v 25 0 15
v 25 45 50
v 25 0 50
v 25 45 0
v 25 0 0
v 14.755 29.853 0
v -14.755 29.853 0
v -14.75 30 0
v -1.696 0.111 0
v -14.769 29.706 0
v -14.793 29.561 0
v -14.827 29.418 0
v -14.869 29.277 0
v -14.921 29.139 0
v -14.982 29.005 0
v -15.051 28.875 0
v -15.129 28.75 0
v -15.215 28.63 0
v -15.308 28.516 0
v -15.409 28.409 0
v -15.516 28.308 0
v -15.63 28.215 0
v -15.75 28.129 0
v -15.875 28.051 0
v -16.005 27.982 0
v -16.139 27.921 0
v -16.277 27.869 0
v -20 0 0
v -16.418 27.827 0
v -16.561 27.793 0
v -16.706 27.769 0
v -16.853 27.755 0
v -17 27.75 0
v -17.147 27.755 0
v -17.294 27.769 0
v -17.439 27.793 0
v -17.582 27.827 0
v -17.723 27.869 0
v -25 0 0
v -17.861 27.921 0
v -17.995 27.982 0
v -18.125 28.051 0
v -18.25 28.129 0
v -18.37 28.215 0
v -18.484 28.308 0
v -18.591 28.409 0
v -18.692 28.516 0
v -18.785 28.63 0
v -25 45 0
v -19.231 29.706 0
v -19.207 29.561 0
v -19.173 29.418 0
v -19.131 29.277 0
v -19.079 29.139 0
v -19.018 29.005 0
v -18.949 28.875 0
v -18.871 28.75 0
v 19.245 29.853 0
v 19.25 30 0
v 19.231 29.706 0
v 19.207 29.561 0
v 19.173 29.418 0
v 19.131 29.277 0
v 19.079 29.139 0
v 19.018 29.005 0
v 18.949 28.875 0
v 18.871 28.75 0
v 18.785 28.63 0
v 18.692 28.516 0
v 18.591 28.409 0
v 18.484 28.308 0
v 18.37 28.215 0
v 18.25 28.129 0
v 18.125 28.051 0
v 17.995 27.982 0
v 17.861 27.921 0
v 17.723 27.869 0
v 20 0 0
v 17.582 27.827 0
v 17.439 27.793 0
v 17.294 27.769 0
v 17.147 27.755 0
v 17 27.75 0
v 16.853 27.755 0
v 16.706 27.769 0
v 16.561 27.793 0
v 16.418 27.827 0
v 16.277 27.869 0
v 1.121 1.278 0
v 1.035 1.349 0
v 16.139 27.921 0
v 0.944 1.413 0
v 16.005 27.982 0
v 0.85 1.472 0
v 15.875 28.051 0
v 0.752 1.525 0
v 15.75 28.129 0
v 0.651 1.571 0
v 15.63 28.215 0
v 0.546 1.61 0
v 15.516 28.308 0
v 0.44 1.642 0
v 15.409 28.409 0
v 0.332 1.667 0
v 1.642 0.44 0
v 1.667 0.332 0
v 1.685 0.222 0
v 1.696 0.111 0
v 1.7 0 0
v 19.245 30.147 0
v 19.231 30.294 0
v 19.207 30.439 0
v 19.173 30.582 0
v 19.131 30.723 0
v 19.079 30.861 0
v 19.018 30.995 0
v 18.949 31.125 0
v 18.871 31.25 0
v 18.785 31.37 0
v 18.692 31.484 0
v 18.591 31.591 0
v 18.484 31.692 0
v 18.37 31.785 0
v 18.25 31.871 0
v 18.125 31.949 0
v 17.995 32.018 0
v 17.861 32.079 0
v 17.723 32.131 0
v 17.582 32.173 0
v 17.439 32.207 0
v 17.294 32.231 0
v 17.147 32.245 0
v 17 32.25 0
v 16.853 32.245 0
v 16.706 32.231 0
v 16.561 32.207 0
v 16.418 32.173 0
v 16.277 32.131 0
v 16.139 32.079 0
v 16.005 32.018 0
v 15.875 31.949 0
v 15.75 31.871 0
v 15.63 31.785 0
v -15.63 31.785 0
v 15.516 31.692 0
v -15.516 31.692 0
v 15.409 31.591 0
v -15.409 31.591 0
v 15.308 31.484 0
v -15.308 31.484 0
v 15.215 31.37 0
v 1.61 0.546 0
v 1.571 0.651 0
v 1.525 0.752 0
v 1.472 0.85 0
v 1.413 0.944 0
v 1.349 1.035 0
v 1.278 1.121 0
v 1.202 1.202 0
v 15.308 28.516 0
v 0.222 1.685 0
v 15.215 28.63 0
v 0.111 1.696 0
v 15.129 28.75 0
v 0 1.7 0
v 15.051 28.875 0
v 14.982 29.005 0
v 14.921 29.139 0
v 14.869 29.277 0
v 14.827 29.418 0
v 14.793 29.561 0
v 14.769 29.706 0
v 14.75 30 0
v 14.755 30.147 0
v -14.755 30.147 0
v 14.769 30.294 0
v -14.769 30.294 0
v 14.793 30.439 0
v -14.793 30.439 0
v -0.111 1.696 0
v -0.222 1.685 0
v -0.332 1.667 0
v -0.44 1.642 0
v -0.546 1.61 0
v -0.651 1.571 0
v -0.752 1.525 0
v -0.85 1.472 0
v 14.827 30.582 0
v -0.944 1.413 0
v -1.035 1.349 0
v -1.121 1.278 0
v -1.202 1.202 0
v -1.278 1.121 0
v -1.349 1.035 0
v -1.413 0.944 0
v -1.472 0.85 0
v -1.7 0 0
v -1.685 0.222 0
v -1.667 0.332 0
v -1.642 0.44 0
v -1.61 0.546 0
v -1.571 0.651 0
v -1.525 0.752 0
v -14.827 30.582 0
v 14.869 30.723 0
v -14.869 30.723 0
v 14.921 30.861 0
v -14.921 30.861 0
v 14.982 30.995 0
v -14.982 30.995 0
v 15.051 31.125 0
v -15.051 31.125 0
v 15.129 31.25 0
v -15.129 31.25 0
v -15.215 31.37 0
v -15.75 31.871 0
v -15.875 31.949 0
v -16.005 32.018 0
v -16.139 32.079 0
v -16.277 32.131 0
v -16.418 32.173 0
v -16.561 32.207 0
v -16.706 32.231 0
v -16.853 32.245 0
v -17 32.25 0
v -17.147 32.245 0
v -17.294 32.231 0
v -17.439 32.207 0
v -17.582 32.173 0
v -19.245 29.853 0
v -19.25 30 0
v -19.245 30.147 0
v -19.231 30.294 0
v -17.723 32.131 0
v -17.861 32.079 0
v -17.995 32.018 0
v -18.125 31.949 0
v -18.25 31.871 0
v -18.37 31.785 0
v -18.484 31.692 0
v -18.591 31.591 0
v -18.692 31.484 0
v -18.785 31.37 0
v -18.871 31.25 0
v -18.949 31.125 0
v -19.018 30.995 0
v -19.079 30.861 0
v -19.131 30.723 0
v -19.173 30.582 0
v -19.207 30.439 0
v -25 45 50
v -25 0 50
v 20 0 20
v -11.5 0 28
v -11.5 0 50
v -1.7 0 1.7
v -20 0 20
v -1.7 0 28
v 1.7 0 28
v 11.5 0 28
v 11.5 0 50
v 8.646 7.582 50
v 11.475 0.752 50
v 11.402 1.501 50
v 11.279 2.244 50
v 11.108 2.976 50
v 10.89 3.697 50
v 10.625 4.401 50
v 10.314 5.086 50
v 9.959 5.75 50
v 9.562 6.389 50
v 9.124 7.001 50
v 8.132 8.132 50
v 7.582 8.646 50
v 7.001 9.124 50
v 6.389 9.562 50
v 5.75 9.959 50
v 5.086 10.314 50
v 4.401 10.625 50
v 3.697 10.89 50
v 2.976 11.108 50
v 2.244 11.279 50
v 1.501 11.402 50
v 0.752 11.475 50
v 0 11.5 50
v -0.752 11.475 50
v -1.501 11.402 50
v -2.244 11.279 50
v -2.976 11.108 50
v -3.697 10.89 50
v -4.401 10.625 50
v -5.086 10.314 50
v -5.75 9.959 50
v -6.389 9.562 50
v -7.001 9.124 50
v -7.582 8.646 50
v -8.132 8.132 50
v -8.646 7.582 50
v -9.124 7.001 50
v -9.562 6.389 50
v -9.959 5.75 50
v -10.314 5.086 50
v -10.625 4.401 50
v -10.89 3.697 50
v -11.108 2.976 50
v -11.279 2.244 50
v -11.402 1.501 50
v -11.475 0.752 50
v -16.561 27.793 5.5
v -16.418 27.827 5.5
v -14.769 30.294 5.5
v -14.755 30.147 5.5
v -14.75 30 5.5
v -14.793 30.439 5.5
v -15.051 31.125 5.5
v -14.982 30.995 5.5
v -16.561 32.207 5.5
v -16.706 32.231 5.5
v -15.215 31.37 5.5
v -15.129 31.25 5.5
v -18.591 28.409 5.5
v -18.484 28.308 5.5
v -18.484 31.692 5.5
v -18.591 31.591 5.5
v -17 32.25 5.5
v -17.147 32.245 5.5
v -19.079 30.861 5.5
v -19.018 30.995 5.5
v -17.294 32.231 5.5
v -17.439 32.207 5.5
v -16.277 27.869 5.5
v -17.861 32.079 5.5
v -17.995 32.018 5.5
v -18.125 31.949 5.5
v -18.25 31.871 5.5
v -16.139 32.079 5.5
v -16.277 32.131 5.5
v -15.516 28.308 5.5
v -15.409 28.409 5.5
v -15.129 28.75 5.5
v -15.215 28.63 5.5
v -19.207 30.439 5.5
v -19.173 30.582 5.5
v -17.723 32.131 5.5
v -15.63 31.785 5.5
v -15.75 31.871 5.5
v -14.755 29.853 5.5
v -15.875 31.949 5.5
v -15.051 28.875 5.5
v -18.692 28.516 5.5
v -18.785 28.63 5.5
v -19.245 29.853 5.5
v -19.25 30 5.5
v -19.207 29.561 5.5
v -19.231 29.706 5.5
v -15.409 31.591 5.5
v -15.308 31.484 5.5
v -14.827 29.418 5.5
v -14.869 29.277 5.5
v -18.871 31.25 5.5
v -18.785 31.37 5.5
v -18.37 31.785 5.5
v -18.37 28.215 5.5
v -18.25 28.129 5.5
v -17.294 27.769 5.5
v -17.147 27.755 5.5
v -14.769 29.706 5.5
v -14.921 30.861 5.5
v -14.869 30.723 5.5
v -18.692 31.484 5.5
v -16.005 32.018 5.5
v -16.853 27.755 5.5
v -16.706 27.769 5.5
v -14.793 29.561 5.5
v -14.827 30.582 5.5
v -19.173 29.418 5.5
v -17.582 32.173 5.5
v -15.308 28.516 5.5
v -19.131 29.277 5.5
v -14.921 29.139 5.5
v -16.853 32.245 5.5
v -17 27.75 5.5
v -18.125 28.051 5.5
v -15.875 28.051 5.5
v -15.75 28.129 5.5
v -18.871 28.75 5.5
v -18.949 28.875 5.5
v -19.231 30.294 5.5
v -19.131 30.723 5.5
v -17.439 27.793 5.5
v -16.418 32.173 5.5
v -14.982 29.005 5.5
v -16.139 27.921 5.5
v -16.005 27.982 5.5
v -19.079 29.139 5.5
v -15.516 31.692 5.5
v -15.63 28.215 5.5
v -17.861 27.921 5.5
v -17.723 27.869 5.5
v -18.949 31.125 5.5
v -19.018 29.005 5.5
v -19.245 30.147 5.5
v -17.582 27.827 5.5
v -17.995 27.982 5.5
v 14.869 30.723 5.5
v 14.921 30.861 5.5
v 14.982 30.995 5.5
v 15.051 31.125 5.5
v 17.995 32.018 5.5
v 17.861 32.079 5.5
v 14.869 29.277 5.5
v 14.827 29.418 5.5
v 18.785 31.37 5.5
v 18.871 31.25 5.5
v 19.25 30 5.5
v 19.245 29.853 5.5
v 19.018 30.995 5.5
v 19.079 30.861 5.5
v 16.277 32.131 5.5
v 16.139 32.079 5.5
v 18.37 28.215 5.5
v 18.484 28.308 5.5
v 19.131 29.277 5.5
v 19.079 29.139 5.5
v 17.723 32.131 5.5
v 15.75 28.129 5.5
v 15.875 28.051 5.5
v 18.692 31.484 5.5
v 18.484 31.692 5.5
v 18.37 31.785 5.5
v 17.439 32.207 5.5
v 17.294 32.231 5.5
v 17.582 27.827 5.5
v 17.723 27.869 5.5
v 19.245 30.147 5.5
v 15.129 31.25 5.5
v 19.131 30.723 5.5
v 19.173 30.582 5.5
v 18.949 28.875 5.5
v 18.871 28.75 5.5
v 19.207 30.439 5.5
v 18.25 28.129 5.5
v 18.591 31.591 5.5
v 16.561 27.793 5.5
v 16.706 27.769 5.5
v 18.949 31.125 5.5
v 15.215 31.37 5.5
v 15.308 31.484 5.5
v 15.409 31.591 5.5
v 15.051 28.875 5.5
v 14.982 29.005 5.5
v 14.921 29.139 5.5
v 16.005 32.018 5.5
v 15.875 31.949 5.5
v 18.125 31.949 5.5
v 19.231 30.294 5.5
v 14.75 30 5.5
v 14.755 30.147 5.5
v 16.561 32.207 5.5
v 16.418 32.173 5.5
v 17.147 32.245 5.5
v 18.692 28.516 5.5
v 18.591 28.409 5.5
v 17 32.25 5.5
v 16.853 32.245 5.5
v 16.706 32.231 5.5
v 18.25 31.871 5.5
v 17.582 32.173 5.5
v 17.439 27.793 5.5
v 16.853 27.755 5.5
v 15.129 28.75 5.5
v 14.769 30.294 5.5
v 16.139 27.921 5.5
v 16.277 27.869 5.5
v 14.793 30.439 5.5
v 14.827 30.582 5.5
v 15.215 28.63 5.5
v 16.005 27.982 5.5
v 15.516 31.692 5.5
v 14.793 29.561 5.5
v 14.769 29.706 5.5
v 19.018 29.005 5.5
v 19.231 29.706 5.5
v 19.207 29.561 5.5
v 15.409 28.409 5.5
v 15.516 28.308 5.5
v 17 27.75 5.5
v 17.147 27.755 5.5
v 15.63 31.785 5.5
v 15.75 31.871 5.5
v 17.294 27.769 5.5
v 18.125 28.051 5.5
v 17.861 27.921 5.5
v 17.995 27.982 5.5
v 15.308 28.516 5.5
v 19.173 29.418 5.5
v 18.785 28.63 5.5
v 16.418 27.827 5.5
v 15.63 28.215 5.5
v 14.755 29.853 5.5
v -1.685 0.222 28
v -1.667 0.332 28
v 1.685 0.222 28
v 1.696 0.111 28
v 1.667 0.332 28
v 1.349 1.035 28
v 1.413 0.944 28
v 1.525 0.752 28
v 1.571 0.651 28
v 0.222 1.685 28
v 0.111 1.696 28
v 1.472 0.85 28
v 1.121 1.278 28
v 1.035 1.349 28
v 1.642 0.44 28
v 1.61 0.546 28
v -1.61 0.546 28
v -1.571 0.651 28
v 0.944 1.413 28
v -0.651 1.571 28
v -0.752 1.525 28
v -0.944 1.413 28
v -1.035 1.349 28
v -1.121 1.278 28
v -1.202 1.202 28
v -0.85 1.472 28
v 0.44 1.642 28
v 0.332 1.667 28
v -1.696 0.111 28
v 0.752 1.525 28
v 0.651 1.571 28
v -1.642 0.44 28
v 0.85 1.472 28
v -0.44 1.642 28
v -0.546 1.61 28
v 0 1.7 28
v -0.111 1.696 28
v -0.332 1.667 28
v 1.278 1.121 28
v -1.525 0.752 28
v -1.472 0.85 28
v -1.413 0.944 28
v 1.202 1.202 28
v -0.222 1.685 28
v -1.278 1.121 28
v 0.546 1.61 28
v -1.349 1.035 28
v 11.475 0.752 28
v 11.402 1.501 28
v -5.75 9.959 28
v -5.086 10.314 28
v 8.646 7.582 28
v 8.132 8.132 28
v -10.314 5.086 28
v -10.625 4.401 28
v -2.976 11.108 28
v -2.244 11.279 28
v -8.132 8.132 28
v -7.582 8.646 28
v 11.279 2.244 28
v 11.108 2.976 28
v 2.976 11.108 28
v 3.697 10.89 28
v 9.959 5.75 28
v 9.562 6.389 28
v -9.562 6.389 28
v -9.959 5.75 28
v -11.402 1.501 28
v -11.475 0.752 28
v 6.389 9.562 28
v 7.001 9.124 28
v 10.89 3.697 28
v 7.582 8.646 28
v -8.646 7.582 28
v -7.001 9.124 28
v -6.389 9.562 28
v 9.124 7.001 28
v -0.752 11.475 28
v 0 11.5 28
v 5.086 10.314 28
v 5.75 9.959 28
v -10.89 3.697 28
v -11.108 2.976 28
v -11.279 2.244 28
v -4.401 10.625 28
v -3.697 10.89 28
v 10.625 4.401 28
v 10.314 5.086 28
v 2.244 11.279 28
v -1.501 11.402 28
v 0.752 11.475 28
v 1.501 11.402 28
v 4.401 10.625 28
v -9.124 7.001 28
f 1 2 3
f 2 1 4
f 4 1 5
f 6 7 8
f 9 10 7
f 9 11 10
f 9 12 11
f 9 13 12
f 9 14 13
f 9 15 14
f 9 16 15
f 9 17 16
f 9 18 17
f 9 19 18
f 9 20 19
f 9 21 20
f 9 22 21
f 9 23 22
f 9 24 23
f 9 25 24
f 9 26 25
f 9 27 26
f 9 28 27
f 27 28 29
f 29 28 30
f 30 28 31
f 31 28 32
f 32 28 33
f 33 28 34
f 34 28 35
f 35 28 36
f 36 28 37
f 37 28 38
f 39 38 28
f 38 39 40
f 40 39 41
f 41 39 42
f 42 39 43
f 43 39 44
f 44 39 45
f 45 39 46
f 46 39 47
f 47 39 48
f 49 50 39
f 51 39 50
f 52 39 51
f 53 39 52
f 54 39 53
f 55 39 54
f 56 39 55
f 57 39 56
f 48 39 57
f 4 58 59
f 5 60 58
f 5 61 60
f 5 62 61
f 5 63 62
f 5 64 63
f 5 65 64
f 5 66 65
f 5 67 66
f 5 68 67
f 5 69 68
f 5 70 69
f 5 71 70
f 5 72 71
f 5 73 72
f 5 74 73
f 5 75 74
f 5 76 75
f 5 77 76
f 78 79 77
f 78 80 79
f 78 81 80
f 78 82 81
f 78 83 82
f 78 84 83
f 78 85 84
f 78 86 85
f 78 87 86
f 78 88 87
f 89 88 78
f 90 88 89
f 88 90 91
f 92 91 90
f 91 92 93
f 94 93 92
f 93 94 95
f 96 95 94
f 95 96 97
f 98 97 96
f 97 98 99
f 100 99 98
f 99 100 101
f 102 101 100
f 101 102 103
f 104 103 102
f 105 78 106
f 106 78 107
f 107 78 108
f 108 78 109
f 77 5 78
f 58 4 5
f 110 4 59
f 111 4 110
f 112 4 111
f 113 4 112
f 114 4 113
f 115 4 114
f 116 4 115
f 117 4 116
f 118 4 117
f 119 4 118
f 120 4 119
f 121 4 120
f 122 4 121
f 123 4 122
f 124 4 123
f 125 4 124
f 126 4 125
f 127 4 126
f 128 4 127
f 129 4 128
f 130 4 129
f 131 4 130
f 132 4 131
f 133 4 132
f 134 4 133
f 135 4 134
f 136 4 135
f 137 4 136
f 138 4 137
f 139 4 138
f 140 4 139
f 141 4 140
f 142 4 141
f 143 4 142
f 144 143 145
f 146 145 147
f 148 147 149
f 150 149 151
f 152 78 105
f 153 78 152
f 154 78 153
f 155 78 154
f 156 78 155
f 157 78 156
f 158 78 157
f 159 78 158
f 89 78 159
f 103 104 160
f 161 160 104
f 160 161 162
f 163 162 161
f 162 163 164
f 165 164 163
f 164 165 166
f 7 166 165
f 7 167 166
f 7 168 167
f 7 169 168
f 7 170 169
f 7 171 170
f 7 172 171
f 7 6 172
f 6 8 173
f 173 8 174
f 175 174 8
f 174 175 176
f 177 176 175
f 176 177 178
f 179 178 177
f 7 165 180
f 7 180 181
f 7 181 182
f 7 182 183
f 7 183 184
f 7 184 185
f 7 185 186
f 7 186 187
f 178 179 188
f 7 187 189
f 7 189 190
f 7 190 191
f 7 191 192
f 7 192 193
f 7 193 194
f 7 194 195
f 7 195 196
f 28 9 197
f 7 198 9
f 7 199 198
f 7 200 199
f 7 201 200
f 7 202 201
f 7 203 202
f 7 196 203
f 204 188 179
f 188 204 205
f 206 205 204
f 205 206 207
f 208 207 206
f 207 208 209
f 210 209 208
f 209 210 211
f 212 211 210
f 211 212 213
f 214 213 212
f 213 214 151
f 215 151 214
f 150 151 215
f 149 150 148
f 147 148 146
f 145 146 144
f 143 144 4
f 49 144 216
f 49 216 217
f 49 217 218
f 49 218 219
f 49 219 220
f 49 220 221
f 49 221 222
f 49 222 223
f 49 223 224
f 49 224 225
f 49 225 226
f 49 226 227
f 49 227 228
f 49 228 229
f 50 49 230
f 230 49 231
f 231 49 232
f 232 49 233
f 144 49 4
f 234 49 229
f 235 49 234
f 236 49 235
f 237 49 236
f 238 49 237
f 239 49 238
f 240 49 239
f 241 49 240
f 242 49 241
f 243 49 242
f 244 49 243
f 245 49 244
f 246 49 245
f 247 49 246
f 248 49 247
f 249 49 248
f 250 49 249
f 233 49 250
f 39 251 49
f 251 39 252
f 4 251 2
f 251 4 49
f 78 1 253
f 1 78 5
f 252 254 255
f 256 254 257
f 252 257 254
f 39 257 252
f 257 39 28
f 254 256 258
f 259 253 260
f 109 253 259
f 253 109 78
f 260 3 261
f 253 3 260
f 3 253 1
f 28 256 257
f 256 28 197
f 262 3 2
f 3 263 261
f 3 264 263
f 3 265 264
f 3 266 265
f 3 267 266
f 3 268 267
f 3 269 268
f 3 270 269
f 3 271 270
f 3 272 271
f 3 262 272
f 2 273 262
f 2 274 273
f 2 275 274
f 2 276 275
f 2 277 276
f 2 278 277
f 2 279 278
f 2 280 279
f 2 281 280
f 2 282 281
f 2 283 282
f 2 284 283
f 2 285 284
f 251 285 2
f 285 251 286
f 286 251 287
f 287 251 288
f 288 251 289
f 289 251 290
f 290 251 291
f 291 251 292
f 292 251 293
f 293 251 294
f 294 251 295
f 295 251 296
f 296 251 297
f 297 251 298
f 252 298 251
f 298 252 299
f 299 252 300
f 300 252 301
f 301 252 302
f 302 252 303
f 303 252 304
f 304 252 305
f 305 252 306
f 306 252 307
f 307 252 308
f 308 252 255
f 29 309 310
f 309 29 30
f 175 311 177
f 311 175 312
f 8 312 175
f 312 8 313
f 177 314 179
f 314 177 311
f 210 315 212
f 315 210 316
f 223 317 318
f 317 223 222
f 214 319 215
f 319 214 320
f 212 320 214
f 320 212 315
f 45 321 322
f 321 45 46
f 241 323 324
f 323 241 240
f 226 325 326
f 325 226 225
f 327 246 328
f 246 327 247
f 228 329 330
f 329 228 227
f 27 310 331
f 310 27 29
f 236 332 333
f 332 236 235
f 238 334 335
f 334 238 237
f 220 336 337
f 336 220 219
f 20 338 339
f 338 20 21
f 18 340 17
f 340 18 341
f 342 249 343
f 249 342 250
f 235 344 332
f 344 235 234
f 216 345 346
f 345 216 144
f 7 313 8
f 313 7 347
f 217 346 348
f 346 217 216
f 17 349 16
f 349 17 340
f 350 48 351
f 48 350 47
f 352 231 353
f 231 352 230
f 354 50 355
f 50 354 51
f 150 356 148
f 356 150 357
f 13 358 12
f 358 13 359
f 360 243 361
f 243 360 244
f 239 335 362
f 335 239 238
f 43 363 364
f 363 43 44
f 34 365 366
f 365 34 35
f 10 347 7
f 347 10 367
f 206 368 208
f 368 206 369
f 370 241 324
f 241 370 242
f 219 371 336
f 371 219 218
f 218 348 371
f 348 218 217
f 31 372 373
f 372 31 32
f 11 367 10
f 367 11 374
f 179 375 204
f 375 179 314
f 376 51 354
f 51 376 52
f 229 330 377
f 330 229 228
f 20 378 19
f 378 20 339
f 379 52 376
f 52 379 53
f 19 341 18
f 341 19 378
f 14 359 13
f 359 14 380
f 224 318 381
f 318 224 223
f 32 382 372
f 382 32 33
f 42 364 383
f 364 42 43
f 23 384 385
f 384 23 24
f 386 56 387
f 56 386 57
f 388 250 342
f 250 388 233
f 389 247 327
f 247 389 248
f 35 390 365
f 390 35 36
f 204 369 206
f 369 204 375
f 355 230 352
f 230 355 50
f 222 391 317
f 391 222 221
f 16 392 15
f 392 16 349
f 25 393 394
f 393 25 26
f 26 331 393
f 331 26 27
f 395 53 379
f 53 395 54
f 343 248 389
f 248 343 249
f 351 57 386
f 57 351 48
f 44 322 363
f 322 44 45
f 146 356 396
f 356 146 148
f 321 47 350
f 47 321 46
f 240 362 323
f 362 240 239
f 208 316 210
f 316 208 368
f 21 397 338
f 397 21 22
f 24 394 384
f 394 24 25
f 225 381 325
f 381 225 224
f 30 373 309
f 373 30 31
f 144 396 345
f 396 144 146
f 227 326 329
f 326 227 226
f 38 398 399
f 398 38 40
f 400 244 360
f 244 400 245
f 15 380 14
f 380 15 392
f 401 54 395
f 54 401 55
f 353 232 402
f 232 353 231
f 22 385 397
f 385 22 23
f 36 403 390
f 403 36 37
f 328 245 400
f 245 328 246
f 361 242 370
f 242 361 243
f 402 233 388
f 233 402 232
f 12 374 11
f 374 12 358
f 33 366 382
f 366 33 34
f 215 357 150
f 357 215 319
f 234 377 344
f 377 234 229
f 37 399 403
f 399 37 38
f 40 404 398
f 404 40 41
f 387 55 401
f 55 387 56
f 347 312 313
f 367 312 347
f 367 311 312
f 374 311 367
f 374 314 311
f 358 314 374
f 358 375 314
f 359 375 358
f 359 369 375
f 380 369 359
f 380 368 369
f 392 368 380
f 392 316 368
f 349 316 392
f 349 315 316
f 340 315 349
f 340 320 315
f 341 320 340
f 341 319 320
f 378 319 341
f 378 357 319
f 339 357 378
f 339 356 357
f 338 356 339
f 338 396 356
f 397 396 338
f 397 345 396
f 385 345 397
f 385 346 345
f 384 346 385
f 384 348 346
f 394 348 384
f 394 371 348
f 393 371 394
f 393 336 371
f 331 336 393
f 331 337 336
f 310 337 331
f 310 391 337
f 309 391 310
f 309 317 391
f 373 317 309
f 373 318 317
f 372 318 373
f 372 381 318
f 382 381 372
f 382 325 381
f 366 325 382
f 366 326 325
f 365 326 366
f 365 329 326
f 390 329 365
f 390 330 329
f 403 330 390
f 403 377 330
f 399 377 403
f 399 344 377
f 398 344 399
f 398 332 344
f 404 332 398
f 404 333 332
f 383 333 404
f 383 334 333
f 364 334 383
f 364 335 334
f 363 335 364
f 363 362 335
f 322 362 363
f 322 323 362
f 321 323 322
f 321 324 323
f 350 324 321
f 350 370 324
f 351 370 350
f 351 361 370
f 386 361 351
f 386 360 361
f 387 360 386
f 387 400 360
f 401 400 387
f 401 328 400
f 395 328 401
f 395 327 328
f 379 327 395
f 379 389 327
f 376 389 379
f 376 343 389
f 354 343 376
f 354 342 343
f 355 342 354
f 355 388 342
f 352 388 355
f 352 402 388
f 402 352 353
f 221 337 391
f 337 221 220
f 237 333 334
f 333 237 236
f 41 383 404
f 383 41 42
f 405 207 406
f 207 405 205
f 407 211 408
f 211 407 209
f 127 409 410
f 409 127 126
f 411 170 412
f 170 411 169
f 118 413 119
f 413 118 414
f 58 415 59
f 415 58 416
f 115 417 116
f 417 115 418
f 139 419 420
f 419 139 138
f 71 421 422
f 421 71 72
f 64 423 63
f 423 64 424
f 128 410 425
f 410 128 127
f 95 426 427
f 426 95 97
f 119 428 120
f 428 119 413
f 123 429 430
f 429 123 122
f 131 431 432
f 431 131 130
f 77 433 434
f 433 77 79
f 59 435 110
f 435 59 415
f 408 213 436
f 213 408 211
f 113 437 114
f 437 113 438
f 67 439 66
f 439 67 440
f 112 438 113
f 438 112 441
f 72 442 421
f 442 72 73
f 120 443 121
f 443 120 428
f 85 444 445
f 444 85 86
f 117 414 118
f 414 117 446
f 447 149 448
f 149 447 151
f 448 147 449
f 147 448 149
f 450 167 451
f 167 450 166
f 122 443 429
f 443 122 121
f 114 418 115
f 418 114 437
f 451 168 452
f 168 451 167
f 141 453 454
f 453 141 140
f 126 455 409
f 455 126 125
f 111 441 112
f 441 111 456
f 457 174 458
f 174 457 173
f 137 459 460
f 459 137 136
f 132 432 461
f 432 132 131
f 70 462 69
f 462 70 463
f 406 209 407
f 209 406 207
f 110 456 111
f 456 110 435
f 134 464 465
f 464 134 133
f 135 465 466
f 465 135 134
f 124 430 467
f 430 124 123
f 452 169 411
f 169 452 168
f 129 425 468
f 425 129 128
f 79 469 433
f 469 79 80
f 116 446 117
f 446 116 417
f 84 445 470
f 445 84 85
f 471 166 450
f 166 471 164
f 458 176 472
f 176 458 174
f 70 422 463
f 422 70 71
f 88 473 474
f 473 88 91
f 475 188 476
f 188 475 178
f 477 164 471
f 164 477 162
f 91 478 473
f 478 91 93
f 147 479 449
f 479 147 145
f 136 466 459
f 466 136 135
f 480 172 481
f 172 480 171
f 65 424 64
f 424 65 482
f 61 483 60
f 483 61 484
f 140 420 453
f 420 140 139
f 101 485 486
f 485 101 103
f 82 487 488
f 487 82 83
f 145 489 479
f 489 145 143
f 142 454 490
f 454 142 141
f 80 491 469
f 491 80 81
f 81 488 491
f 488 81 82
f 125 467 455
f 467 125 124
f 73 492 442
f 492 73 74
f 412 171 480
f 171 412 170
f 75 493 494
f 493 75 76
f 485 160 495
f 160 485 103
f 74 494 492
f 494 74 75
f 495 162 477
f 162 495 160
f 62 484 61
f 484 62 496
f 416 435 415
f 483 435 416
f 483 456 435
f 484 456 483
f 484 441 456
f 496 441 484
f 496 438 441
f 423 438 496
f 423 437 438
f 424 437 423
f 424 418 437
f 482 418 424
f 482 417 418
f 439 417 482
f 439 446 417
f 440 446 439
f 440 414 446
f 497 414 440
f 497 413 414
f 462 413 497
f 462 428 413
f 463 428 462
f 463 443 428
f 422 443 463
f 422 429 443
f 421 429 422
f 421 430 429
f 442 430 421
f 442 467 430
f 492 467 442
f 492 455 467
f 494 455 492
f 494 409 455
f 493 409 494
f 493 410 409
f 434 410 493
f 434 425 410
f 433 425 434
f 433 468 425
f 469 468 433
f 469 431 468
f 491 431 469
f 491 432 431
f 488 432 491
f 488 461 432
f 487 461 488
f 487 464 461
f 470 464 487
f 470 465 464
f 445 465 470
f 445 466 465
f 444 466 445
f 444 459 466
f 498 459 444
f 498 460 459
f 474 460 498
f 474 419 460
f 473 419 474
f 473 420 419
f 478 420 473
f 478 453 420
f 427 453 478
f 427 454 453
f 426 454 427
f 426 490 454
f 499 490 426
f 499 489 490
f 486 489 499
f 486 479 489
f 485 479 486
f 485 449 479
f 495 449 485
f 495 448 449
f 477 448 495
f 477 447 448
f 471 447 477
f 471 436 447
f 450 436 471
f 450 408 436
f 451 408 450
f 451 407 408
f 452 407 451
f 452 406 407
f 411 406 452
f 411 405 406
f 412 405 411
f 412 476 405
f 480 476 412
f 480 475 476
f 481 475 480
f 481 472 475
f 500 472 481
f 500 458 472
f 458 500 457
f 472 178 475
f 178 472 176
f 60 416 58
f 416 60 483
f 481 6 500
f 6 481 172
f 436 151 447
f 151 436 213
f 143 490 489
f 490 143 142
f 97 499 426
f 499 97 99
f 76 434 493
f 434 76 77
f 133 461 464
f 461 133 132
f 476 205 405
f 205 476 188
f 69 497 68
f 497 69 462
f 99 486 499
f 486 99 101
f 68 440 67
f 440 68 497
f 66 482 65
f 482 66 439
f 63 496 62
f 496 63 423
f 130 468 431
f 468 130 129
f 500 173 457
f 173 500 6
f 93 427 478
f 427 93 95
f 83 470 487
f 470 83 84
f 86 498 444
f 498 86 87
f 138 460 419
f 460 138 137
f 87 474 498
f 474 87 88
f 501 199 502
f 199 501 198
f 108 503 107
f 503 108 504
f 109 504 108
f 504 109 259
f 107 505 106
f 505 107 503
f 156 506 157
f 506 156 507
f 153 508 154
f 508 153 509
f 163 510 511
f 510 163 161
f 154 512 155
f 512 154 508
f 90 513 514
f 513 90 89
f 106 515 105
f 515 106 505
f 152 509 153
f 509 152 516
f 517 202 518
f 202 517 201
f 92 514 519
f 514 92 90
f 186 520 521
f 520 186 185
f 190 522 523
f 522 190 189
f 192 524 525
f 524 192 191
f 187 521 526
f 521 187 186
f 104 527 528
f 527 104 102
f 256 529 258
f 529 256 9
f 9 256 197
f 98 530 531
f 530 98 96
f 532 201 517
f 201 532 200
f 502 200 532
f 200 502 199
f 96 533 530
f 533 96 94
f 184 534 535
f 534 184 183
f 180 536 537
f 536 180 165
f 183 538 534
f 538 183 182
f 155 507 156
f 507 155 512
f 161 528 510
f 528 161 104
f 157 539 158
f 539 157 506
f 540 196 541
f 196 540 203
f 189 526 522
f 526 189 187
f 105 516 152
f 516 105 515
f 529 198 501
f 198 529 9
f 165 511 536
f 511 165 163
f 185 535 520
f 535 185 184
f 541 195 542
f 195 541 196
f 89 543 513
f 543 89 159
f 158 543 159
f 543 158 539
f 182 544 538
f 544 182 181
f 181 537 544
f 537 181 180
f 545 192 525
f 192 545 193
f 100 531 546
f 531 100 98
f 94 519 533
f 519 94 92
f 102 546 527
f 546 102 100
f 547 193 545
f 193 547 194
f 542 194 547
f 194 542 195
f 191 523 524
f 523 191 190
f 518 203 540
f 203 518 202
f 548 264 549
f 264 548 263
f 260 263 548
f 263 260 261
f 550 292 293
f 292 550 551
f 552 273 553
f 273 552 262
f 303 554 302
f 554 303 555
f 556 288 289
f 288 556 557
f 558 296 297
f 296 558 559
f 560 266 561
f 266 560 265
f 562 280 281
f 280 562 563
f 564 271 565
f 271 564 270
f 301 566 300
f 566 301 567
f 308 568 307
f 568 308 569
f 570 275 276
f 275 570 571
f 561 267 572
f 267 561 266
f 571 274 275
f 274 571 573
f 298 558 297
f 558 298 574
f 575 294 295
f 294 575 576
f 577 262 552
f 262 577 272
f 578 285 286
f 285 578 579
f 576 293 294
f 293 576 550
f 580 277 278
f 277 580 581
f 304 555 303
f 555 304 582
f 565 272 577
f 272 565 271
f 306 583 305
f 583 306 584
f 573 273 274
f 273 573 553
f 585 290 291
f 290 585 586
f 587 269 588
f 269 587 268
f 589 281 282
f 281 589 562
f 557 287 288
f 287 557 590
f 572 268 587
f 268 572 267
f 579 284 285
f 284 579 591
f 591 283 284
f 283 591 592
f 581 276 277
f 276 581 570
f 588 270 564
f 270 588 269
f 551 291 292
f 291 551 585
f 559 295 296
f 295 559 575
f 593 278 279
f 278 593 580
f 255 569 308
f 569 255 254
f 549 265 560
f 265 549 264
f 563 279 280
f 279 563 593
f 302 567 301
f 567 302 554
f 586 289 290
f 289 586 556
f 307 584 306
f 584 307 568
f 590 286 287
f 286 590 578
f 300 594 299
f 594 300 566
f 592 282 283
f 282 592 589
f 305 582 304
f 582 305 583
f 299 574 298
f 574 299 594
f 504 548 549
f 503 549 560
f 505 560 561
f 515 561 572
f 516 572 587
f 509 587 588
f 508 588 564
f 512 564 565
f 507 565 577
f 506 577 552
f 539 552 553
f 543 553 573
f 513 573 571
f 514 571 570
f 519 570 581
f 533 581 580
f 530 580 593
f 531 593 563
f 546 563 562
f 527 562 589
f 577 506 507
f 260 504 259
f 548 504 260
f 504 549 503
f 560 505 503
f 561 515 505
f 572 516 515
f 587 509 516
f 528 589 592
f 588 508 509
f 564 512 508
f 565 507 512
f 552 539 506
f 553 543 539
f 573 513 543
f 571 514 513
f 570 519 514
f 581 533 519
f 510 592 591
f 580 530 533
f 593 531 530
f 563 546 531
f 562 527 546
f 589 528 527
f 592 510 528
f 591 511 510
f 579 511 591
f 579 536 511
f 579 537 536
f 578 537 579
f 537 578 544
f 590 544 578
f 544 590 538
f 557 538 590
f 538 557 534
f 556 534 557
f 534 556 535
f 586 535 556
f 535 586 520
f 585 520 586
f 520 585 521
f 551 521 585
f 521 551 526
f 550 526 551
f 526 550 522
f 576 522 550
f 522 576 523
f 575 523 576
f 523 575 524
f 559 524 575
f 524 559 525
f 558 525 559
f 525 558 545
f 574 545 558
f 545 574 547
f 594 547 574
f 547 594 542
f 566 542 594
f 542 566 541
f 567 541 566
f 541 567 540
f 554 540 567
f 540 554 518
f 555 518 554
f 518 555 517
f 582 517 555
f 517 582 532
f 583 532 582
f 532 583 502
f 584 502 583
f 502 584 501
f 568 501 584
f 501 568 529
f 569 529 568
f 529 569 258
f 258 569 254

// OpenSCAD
// L-shaped mounting bracket for NEMA 17 stepper motor
// Print orientation: base plate on bed (z = 0), motor plate builds upward

// ---------- Parameters ----------
base_x      = 25;    // base plate half-width (X)
base_y      = 45;    // base plate length (Y)
base_t      = 5;     // base plate thickness (Z)

screw_d     = 4.5;   // through-hole diameter (M4)
screw_x     = 17;    // screw hole offset from centre (X)
screw_y     = 30;    // screw hole offset from centre (Y)

motor_h     = 50;    // motor plate height (Z)
motor_d     = 23;    // motor boss hole diameter
boss_x      = 0;     // boss hole centre (X)
boss_z      = 28;    // boss hole centre (Z)

screw_d2    = 3.4;   // M3 screw holes diameter
screw_pat   = 31;    // square pattern size (X and Y)

gusset_t    = 5;     // gusset thickness (X)
gusset_l    = 20;    // gusset leg length (Y and Z)
gusset_x0   = -20;   // left gusset start (X)
gusset_x1   = 20;    // right gusset start (X)

eps         = 0.5;   // cutter overshoot

$fn = 96;

// ---------- Model ----------
difference() {
    union() {
        // Base plate
        translate([-base_x, 0, 0])
            cube([2 * base_x, base_y, base_t]);

        // Motor plate
        translate([-base_x, 0, 0])
            cube([2 * base_x, base_y, motor_h]);
    }

    // Screw holes in base plate
    for (sx = [-1, 1])
        translate([sx * screw_x, screw_y, -eps])
            cylinder(d = screw_d, h = base_t + 2 * eps);

    // Motor boss hole
    translate([boss_x, 0, boss_z])
        cylinder(d = motor_d, h = base_y + eps);

    // M3 screw holes on square pattern
    for (a = [0, 90, 180, 270])
        rotate([0, 0, a])
            translate([0, 0, -eps])
                cylinder(d = screw_d2, h = motor_h + 2 * eps);

    // Gussets
    for (sx = [gusset_x0, gusset_x1])
        translate([sx, 0, 0])
            rotate([90, 0, 0])
                linear_extrude(height = gusset_l)
                    polygon([[0, 0], [gusset_l, 0], [0, gusset_l]]);
}
